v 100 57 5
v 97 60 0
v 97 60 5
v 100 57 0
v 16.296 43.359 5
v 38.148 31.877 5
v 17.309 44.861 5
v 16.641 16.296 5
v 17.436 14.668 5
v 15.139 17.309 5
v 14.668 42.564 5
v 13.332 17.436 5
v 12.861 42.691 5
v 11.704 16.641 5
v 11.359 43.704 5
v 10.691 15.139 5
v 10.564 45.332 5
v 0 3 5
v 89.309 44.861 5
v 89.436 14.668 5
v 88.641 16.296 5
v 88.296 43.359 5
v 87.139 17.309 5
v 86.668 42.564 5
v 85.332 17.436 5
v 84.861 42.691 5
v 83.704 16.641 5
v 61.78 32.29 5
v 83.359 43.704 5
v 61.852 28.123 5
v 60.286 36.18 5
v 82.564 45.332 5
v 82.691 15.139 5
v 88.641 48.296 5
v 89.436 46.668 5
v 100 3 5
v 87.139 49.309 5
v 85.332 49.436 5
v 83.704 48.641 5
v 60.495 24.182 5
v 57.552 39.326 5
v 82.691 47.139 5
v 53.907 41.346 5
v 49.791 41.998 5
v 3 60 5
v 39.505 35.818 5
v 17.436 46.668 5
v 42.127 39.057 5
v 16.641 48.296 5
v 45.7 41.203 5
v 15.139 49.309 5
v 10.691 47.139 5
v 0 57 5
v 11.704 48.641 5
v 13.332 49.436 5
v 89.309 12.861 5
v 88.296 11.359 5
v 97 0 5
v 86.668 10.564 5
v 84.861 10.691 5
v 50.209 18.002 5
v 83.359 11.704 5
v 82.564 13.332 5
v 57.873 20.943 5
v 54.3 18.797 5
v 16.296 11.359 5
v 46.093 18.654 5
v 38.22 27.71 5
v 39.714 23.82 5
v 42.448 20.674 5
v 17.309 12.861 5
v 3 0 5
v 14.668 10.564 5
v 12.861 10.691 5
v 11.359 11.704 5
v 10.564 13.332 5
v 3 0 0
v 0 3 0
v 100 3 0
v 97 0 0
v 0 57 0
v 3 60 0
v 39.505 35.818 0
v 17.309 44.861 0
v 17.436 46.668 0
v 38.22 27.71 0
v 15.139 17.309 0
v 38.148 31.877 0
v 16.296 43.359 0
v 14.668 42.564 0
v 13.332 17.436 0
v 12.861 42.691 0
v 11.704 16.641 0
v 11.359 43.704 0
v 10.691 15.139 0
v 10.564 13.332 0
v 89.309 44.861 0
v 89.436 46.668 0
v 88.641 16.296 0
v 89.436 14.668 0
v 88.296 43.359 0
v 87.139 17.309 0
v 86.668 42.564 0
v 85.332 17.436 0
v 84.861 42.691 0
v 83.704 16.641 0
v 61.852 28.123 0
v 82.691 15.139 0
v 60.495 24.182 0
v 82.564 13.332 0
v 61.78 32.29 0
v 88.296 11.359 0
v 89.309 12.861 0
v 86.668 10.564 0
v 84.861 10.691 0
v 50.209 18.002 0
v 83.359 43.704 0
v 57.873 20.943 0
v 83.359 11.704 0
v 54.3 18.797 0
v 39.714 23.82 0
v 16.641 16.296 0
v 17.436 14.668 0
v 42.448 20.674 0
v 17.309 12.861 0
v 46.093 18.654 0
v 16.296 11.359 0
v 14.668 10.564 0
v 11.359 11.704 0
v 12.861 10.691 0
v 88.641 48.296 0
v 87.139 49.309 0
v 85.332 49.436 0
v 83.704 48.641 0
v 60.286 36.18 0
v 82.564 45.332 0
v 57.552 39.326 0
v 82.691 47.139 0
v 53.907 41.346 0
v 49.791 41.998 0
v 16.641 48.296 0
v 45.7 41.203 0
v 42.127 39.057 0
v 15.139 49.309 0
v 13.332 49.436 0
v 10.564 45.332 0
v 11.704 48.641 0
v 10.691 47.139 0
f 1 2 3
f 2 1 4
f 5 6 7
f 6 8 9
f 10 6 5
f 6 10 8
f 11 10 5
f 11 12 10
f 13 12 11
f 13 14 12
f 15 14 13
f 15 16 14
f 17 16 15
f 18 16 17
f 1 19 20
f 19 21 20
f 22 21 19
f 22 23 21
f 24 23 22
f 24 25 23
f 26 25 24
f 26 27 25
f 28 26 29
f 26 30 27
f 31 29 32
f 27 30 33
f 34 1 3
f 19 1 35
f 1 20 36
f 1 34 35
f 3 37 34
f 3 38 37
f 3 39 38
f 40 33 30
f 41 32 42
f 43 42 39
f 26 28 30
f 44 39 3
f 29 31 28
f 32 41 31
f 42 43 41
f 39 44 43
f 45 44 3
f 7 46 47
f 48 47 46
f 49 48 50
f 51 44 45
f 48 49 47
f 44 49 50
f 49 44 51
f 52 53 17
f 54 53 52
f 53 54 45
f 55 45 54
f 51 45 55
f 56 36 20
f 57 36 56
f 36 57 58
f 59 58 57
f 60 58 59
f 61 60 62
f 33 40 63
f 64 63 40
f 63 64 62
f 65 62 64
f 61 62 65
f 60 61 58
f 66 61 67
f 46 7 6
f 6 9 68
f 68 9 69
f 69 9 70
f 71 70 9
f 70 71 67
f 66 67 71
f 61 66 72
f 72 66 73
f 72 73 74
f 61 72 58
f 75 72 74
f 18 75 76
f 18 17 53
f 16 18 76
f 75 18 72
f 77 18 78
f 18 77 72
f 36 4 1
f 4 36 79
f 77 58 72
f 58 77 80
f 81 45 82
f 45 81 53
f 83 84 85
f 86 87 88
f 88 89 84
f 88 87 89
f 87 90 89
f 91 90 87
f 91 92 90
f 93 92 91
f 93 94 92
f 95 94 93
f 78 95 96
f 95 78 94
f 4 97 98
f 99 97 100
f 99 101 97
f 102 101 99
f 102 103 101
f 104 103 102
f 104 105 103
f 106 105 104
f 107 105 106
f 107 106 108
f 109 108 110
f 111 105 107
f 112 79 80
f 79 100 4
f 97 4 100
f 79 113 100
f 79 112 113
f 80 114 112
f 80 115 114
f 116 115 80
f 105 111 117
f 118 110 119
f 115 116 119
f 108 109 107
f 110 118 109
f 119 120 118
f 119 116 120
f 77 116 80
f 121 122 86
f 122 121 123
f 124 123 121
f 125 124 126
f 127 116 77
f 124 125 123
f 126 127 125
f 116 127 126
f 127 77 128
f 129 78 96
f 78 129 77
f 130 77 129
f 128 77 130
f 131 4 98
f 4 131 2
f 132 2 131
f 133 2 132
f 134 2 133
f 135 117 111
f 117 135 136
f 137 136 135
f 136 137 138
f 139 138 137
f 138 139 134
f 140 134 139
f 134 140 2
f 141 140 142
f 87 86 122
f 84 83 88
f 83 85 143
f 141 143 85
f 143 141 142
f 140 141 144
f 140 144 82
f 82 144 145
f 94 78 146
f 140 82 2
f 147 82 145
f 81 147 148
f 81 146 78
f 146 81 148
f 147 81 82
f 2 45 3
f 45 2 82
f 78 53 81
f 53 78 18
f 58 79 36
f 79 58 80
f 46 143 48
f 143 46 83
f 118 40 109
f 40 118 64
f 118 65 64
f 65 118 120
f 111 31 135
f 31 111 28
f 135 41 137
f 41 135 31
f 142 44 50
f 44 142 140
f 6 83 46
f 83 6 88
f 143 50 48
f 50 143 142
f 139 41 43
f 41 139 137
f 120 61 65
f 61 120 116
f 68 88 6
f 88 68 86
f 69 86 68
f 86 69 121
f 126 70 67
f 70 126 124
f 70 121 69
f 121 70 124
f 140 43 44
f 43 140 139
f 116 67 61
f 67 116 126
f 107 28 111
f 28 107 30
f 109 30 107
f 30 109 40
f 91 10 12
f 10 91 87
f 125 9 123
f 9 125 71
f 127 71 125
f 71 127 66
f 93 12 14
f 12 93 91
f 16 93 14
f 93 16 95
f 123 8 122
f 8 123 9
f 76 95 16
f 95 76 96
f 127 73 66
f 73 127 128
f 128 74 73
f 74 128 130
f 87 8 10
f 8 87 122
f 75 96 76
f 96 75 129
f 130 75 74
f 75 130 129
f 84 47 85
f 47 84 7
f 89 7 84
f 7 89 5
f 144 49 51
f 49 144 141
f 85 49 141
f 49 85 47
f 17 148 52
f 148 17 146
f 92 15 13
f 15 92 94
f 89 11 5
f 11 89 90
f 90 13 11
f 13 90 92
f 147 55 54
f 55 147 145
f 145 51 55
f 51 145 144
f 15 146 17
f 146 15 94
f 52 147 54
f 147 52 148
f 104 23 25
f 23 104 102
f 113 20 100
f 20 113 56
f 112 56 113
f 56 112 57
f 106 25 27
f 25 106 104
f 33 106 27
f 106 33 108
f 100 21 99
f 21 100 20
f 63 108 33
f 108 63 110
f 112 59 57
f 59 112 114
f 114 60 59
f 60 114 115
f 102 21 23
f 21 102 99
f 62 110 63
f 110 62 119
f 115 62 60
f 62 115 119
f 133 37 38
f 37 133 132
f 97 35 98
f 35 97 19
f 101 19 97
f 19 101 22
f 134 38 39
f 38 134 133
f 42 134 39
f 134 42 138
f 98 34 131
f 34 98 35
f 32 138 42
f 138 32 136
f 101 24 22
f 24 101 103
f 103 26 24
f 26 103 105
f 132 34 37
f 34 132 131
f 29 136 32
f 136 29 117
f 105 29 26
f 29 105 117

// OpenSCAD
$fn = 32;

// ----------------------------------------------------------------------
// Spacer plate: rect 100 x 60
// ----------------------------------------------------------------------

// --- parameters (mm) ---
bore_r = 12;              // centre bore radius
bolt_r = 3.5;             // bolt hole radius
plate_t = 5;              // plate thickness, Z (extrusion height)
plate_l = 100;            // plate length, X
plate_w = 60;             // plate width, Y
inset = 14;               // corner hole inset
fit_tol = 0.05;           // declared fit tolerance (prompt contract)
free_tol = 0.3;           // declared free tolerance (prompt contract)

profile = [[3, 0], [97, 0], [100, 3], [100, 57], [97, 60], [3, 60], [0, 57], [0, 3]];  // primary outline, 8 points, counter clockwise
void_1 = [[61.78, 32.29], [60.286, 36.18], [57.552, 39.326], [53.907, 41.346], [49.791, 41.998], [45.7, 41.203], [42.127, 39.057], [39.505, 35.818], [38.148, 31.877], [38.22, 27.71], [39.714, 23.82], [42.448, 20.674], [46.093, 18.654], [50.209, 18.002], [54.3, 18.797], [57.873, 20.943], [60.495, 24.182], [61.852, 28.123]];  // centre bore, 18 points
void_2 = [[17.436, 14.668], [16.641, 16.296], [15.139, 17.309], [13.332, 17.436], [11.704, 16.641], [10.691, 15.139], [10.564, 13.332], [11.359, 11.704], [12.861, 10.691], [14.668, 10.564], [16.296, 11.359], [17.309, 12.861]];  // corner hole, 12 points
void_3 = [[17.436, 46.668], [16.641, 48.296], [15.139, 49.309], [13.332, 49.436], [11.704, 48.641], [10.691, 47.139], [10.564, 45.332], [11.359, 43.704], [12.861, 42.691], [14.668, 42.564], [16.296, 43.359], [17.309, 44.861]];  // corner hole, 12 points
void_4 = [[89.436, 14.668], [88.641, 16.296], [87.139, 17.309], [85.332, 17.436], [83.704, 16.641], [82.691, 15.139], [82.564, 13.332], [83.359, 11.704], [84.861, 10.691], [86.668, 10.564], [88.296, 11.359], [89.309, 12.861]];  // corner hole, 12 points
void_5 = [[89.436, 46.668], [88.641, 48.296], [87.139, 49.309], [85.332, 49.436], [83.704, 48.641], [82.691, 47.139], [82.564, 45.332], [83.359, 43.704], [84.861, 42.691], [86.668, 42.564], [88.296, 43.359], [89.309, 44.861]];  // corner hole, 12 points

// --- the one profile operation ---
difference() {
  linear_extrude(height = plate_t) polygon(points = profile);
  translate([0, 0, -1])
    linear_extrude(height = plate_t + 2) polygon(points = void_1);
  translate([0, 0, -1])
    linear_extrude(height = plate_t + 2) polygon(points = void_2);
  translate([0, 0, -1])
    linear_extrude(height = plate_t + 2) polygon(points = void_3);
  translate([0, 0, -1])
    linear_extrude(height = plate_t + 2) polygon(points = void_4);
  translate([0, 0, -1])
    linear_extrude(height = plate_t + 2) polygon(points = void_5);
}
